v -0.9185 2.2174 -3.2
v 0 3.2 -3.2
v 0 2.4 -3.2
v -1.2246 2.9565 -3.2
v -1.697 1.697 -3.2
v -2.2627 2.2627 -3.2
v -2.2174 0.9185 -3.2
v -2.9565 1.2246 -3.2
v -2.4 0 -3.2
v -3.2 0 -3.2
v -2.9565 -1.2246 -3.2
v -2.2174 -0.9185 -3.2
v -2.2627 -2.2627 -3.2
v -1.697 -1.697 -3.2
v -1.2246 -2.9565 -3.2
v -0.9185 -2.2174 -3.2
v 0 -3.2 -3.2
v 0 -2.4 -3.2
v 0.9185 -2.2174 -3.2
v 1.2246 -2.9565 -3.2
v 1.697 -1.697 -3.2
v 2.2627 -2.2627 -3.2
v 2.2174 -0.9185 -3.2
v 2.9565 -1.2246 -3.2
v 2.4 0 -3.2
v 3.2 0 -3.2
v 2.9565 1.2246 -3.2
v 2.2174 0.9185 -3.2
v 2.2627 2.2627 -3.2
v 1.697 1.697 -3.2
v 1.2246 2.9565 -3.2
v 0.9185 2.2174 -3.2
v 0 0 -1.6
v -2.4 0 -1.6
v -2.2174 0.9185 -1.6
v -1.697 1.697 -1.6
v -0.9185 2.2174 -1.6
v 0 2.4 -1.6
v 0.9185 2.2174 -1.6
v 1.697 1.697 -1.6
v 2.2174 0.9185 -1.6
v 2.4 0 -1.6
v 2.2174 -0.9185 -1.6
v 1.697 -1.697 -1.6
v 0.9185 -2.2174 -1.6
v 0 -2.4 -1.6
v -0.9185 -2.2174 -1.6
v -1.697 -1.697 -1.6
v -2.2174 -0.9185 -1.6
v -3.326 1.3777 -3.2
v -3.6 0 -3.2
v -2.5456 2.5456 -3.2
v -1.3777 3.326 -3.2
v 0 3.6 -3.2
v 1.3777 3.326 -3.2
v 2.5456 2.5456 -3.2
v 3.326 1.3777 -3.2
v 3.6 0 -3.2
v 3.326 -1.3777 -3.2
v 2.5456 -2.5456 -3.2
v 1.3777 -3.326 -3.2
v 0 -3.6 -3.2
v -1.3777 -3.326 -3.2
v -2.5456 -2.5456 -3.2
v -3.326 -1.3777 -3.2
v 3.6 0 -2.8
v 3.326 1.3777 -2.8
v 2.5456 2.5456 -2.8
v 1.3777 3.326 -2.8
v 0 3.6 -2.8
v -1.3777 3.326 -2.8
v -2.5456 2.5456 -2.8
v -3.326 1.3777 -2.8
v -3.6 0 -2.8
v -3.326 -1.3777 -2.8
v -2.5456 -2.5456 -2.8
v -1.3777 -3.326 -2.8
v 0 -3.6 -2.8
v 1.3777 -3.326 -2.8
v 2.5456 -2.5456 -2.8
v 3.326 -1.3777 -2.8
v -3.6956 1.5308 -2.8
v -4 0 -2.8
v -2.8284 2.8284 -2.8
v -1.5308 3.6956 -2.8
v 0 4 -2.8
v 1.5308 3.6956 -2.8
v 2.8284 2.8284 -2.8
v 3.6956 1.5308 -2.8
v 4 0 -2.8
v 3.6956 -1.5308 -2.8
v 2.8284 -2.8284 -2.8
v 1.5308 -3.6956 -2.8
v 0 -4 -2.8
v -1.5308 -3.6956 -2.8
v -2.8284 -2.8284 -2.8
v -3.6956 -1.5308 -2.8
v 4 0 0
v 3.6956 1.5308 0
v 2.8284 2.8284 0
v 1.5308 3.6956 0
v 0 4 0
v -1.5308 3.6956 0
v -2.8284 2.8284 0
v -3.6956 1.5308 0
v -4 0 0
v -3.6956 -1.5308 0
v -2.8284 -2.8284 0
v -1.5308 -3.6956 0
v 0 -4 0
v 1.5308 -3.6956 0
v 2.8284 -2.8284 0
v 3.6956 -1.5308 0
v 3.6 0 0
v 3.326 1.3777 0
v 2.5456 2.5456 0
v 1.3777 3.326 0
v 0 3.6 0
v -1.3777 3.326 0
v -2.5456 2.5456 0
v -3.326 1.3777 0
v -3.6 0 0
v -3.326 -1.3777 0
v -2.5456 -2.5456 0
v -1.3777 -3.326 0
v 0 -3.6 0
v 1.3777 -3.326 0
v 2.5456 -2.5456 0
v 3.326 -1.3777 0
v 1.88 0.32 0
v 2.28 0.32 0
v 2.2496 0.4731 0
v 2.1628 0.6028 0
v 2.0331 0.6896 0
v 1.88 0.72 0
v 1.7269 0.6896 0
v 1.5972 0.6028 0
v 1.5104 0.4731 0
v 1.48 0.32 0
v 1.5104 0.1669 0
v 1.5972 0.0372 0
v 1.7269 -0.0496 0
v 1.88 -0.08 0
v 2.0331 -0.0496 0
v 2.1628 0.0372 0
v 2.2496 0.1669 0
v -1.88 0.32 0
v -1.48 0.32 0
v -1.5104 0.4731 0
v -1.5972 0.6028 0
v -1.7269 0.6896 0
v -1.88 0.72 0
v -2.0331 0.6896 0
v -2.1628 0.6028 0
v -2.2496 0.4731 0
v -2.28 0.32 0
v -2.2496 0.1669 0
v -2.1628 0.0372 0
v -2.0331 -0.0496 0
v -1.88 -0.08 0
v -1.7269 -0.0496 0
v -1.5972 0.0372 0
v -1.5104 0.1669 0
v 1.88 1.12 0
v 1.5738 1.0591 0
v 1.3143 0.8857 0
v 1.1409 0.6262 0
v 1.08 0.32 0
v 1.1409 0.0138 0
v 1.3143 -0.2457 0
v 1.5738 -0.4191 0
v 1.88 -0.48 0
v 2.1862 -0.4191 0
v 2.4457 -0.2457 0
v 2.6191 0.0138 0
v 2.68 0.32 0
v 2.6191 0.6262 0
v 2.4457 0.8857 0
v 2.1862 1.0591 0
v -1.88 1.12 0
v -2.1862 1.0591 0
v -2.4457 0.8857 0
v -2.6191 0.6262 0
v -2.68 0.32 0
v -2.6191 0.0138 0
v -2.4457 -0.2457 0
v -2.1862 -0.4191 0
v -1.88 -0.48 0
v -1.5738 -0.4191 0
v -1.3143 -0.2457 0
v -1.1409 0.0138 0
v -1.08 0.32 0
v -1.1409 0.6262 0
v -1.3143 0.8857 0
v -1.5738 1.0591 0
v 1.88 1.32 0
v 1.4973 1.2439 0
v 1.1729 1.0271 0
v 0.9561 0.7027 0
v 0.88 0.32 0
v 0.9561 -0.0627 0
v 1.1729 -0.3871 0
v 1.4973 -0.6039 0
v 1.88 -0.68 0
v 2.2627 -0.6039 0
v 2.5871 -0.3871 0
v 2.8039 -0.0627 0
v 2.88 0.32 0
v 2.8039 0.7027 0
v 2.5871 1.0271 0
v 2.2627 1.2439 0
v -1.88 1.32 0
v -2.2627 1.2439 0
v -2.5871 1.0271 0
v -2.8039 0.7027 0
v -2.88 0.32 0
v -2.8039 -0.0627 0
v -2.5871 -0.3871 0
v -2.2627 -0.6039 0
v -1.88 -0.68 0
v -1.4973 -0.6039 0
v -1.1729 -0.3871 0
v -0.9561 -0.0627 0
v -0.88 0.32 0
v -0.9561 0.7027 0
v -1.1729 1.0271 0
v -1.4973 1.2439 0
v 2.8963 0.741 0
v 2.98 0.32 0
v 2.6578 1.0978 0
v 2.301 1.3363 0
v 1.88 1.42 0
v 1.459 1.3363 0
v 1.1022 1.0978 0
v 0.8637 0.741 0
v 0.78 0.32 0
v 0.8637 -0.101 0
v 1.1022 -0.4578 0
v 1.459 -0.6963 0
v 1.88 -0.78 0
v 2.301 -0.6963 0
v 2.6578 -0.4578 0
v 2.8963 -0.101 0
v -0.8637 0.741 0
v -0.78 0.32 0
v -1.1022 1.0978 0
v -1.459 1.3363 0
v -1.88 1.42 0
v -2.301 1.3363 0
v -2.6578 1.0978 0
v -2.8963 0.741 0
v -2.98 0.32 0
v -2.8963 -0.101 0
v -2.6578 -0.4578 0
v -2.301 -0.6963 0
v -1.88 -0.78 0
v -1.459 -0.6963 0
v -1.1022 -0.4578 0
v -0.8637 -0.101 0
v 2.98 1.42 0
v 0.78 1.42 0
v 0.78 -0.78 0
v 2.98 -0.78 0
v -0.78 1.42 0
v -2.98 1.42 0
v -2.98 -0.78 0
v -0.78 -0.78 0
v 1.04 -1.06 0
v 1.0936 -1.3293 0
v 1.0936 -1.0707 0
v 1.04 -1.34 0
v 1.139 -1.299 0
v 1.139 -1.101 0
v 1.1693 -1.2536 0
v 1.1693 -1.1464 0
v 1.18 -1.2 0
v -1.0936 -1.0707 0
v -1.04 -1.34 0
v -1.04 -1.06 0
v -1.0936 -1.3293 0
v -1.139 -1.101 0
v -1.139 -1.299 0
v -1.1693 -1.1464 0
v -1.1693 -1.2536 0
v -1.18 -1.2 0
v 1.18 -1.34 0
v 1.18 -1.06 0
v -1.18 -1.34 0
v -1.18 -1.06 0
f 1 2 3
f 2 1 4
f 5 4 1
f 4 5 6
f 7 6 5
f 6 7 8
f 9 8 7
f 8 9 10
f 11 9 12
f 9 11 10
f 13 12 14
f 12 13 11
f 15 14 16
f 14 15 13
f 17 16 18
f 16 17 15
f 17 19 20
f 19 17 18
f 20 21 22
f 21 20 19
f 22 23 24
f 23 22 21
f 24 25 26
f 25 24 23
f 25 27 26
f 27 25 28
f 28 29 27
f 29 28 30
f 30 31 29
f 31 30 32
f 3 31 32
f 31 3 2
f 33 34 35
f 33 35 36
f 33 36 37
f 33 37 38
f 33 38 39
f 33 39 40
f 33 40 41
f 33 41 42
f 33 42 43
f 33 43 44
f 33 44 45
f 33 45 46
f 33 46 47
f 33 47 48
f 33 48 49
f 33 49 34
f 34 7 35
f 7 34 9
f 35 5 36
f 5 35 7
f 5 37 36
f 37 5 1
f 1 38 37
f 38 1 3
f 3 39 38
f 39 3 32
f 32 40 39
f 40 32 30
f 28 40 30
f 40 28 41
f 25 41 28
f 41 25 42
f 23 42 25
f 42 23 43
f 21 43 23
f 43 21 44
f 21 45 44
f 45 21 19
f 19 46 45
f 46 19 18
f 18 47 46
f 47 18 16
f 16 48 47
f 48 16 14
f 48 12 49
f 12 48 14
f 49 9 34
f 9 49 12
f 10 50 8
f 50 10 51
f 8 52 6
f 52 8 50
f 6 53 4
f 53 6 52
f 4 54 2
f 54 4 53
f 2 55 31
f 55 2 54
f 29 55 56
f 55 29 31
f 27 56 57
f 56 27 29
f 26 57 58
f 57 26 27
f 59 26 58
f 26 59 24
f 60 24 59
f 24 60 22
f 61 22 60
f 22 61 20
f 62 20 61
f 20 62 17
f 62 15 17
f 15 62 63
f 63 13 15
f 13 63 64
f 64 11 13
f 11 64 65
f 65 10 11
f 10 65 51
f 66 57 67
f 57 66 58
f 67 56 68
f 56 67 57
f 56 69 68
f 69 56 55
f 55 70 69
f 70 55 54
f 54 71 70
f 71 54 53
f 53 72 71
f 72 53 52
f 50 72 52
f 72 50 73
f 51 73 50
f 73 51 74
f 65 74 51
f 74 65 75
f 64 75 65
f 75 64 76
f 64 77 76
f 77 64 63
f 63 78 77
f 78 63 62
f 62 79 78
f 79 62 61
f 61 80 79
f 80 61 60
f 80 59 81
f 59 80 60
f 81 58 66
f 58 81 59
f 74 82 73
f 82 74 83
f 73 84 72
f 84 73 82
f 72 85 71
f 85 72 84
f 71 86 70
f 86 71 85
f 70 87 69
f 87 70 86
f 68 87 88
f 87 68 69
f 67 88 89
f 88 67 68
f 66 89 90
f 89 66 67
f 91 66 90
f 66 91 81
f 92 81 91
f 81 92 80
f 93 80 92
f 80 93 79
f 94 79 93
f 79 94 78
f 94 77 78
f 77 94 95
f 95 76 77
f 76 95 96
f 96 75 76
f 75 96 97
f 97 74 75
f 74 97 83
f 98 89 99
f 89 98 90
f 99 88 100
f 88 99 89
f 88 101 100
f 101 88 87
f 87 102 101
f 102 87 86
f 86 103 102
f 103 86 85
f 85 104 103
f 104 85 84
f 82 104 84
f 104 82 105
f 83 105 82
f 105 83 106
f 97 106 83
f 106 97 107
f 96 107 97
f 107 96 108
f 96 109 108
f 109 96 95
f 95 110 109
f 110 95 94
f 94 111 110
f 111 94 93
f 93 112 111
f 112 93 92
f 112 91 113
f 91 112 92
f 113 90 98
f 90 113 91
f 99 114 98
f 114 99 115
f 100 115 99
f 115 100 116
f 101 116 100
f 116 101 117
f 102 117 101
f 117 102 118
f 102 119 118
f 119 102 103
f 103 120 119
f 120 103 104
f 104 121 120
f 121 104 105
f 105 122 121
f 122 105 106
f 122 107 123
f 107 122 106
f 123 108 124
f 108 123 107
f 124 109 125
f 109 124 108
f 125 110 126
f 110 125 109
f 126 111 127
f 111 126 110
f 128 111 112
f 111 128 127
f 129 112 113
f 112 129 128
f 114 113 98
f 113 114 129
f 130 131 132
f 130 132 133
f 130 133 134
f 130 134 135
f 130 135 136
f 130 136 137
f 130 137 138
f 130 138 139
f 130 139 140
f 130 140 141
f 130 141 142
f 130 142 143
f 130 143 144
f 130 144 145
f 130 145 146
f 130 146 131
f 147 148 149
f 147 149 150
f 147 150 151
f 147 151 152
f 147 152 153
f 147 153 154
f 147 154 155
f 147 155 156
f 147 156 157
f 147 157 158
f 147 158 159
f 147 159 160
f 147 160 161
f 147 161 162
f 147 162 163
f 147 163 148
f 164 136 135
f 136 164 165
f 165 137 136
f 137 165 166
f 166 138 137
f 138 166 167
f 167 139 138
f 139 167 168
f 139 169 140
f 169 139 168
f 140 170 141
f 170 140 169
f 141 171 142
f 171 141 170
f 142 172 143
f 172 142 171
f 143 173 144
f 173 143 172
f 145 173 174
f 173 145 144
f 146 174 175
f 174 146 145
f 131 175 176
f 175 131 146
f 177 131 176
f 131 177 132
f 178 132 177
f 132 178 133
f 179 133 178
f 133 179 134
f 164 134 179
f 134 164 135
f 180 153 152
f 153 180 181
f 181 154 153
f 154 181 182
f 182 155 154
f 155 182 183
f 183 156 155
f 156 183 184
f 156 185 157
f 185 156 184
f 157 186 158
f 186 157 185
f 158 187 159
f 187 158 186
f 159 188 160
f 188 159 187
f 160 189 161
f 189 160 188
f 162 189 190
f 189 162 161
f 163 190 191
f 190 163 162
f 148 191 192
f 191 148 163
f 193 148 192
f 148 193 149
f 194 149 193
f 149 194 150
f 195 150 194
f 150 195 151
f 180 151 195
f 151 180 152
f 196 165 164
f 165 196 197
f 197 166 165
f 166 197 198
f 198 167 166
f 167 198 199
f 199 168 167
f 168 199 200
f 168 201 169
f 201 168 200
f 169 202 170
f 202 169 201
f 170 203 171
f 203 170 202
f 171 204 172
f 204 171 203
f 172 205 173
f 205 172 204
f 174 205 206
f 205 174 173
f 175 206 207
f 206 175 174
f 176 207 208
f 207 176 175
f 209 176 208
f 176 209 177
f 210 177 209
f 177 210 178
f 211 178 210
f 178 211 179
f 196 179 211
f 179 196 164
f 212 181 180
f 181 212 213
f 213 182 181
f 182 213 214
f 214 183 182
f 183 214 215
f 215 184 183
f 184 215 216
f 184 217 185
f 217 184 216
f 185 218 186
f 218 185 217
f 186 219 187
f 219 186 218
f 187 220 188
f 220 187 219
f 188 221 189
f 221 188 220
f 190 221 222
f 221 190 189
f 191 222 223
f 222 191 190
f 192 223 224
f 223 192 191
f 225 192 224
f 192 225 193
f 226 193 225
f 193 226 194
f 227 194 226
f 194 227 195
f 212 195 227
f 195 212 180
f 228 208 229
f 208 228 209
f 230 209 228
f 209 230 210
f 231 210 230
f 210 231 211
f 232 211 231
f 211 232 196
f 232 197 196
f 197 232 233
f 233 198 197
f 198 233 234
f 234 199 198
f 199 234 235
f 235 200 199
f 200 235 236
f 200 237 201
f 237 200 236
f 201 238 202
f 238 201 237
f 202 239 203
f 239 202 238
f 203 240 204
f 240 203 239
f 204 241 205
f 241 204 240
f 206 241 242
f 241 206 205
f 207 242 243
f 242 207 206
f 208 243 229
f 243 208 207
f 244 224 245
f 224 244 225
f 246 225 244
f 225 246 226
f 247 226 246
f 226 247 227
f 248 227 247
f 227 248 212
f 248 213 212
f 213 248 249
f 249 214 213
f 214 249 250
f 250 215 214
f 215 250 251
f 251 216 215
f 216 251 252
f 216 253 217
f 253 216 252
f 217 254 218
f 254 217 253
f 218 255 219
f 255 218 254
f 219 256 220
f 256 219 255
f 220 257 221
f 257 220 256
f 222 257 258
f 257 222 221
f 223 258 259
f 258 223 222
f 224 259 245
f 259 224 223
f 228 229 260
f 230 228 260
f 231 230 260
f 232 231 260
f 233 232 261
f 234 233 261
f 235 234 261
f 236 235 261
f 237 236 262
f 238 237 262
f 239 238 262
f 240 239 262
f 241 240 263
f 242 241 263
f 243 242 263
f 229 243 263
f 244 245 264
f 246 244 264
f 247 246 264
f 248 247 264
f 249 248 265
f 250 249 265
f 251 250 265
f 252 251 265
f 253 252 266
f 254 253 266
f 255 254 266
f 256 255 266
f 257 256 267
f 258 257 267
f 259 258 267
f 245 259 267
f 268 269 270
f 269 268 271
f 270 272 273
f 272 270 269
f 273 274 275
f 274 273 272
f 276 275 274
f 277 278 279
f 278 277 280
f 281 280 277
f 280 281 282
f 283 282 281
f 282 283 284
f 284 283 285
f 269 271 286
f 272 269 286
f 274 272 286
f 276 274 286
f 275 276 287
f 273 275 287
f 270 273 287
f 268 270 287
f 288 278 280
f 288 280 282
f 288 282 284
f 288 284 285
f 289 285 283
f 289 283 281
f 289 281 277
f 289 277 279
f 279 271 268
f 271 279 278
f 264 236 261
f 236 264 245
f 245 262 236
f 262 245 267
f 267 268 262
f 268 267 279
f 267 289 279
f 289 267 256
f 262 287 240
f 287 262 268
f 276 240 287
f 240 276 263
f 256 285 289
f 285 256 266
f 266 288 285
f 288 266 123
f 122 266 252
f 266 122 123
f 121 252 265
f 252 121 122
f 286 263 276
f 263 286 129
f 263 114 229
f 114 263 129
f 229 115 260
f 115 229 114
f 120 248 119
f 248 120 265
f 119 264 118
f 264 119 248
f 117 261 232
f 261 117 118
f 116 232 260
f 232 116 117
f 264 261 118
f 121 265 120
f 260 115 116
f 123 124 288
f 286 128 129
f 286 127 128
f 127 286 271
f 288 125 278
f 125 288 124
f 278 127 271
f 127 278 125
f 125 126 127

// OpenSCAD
use <../lib.scad>
use <../p/2-4chrd.scad>
use <../p/2-4ndis.scad>
use <../p/4-4disc.scad>
use <../p/4-4ering.scad>
use <../p/4-4ndis.scad>
use <../p/4-4ring1.scad>
use <../p/4-4ring10.scad>
use <../p/4-4ring4.scad>
use <s/98138s01.scad>
function ldraw_lib__98138p1q() = [
// 0 Tile  1 x  1 Round with Bright Light Yellow Emoji with Wide Open Eyes and Tight Lipped Straight Mouth Pattern
// 0 Name: 98138p1q.dat
// 0 Author: Gerald Lasser [GeraldLasser]
// 0 !LDRAW_ORG Part UPDATE 2024-02
// 0 !LICENSE Licensed under CC BY 4.0 : see CAreadme.txt
// 
// 0 BFC CERTIFY CCW
  [0,"BFC","CERTIFY"],
  [0,"BFC","CCW"],
// 
// 0 !KEYWORDS Astonished, Creativity Box, Dots, Scared
// 
// 0 !HISTORY 2022-01-14 [PTadmin] Official Update 2022-01
// 0 !HISTORY 2024-03-23 [OrionP] Updated ring primitives
// 0 !HISTORY 2024-03-24 [OrionP] Official Update 2024-02
// 
// 1 16 0 0 0 1 0 0 0 1 0 0 0 1 s\98138s01.dat
  [1,16,0,0,0,1,0,0,0,1,0,0,0,1, ldraw_lib__s__98138s01()],
// 1 226 0 0 0 9 0 0 0 1 0 0 0 9 4-4ering.dat
  [1,226,0,0,0,9,0,0,0,1,0,0,0,9, ldraw_lib__4_4ering()],
// 
// 1 0 4.7 0 .8 1 0 0 0 1 0 0 0 1 4-4disc.dat
  [1,0,4.7,0,.8,1,0,0,0,1,0,0,0,1, ldraw_lib__4_4disc()],
// 1 0 -4.7 0 .8 1 0 0 0 1 0 0 0 1 4-4disc.dat
  [1,0,-4.7,0,.8,1,0,0,0,1,0,0,0,1, ldraw_lib__4_4disc()],
// 1 15 4.7 0 .8 1 0 0 0 1 0 0 0 1 4-4ring1.dat
  [1,15,4.7,0,.8,1,0,0,0,1,0,0,0,1, ldraw_lib__4_4ring1()],
// 1 15 -4.7 0 .8 1 0 0 0 1 0 0 0 1 4-4ring1.dat
  [1,15,-4.7,0,.8,1,0,0,0,1,0,0,0,1, ldraw_lib__4_4ring1()],
// 1 0 4.7 0 .8 .5 0 0 0 1 0 0 0 .5 4-4ring4.dat
  [1,0,4.7,0,.8,.5,0,0,0,1,0,0,0,.5, ldraw_lib__4_4ring4()],
// 1 0 -4.7 0 .8 .5 0 0 0 1 0 0 0 .5 4-4ring4.dat
  [1,0,-4.7,0,.8,.5,0,0,0,1,0,0,0,.5, ldraw_lib__4_4ring4()],
// 1 0 4.7 0 .8 .25 0 0 0 1 0 0 0 .25 4-4ring10.dat
  [1,0,4.7,0,.8,.25,0,0,0,1,0,0,0,.25, ldraw_lib__4_4ring10()],
// 1 0 -4.7 0 .8 .25 0 0 0 1 0 0 0 .25 4-4ring10.dat
  [1,0,-4.7,0,.8,.25,0,0,0,1,0,0,0,.25, ldraw_lib__4_4ring10()],
// 1 226 4.7 0 .8 2.75 0 0 0 1 0 0 0 2.75 4-4ndis.dat
  [1,226,4.7,0,.8,2.75,0,0,0,1,0,0,0,2.75, ldraw_lib__4_4ndis()],
// 1 226 -4.7 0 .8 2.75 0 0 0 1 0 0 0 2.75 4-4ndis.dat
  [1,226,-4.7,0,.8,2.75,0,0,0,1,0,0,0,2.75, ldraw_lib__4_4ndis()],
// 
// 1 0 2.6 0 -3 0 0 .35 0 1 0 -.35 0 0 2-4chrd.dat
  [1,0,2.6,0,-3,0,0,.35,0,1,0,-.35,0,0, ldraw_lib__2_4chrd()],
// 1 0 -2.6 0 -3 0 0 -.35 0 1 0 -.35 0 0 2-4chrd.dat
  [1,0,-2.6,0,-3,0,0,-.35,0,1,0,-.35,0,0, ldraw_lib__2_4chrd()],
// 1 226 2.6 0 -3 0 0 .35 0 1 0 -.35 0 0 2-4ndis.dat
  [1,226,2.6,0,-3,0,0,.35,0,1,0,-.35,0,0, ldraw_lib__2_4ndis()],
// 1 226 -2.6 0 -3 0 0 -.35 0 1 0 -.35 0 0 2-4ndis.dat
  [1,226,-2.6,0,-3,0,0,-.35,0,1,0,-.35,0,0, ldraw_lib__2_4ndis()],
// 
// 4 0 2.6 0 -2.65 -2.6 0 -2.65 -2.6 0 -3.35 2.6 0 -3.35
  [4,0,2.6,0,-2.65,-2.6,0,-2.65,-2.6,0,-3.35,2.6,0,-3.35],
// 4 226 1.95 0 .8 1.95 0 3.55 -1.95 0 3.55 -1.95 0 .8
  [4,226,1.95,0,.8,1.95,0,3.55,-1.95,0,3.55,-1.95,0,.8],
// 4 226 1.95 0 .8 -1.95 0 .8 -1.95 0 -1.95 1.95 0 -1.95
  [4,226,1.95,0,.8,-1.95,0,.8,-1.95,0,-1.95,1.95,0,-1.95],
// 4 226 2.6 0 -2.65 1.95 0 -1.95 -1.95 0 -1.95 -2.6 0 -2.65
  [4,226,2.6,0,-2.65,1.95,0,-1.95,-1.95,0,-1.95,-2.6,0,-2.65],
// 4 226 -4.7 0 -1.95 -2.95 0 -2.65 -2.6 0 -2.65 -1.95 0 -1.95
  [4,226,-4.7,0,-1.95,-2.95,0,-2.65,-2.6,0,-2.65,-1.95,0,-1.95],
// 4 226 1.95 0 -1.95 2.6 0 -2.65 2.95 0 -2.65 4.7 0 -1.95
  [4,226,1.95,0,-1.95,2.6,0,-2.65,2.95,0,-2.65,4.7,0,-1.95],
// 4 226 7.45 0 -1.95 4.7 0 -1.95 2.95 0 -2.65 2.95 0 -3
  [4,226,7.45,0,-1.95,4.7,0,-1.95,2.95,0,-2.65,2.95,0,-3],
// 4 226 -2.95 0 -3 -2.95 0 -2.65 -4.7 0 -1.95 -7.45 0 -1.95
  [4,226,-2.95,0,-3,-2.95,0,-2.65,-4.7,0,-1.95,-7.45,0,-1.95],
// 4 226 -2.95 0 -3.35 -2.95 0 -3 -7.45 0 -1.95 -8.3151 0 -3.4443
  [4,226,-2.95,0,-3.35,-2.95,0,-3,-7.45,0,-1.95,-8.3151,0,-3.4443],
// 4 226 -9 0 0 -8.3151 0 -3.4443 -7.45 0 -1.95 -7.45 0 .8
  [4,226,-9,0,0,-8.3151,0,-3.4443,-7.45,0,-1.95,-7.45,0,.8],
// 4 226 -9 0 0 -7.45 0 .8 -7.45 0 3.55 -8.3151 0 3.4443
  [4,226,-9,0,0,-7.45,0,.8,-7.45,0,3.55,-8.3151,0,3.4443],
// 4 226 7.45 0 -1.95 2.95 0 -3 2.95 0 -3.35 8.3151 0 -3.4443
  [4,226,7.45,0,-1.95,2.95,0,-3,2.95,0,-3.35,8.3151,0,-3.4443],
// 4 226 7.45 0 -1.95 8.3151 0 -3.4443 9 0 0 7.45 0 .8
  [4,226,7.45,0,-1.95,8.3151,0,-3.4443,9,0,0,7.45,0,.8],
// 4 226 7.45 0 .8 9 0 0 8.3151 0 3.4443 7.45 0 3.55
  [4,226,7.45,0,.8,9,0,0,8.3151,0,3.4443,7.45,0,3.55],
// 4 226 -7.45 0 3.55 -4.7 0 3.55 -3.4443 0 8.3151 -6.3639 0 6.3639
  [4,226,-7.45,0,3.55,-4.7,0,3.55,-3.4443,0,8.3151,-6.3639,0,6.3639],
// 4 226 -4.7 0 3.55 -1.95 0 3.55 0 0 9 -3.4443 0 8.3151
  [4,226,-4.7,0,3.55,-1.95,0,3.55,0,0,9,-3.4443,0,8.3151],
// 4 226 0 0 9 1.95 0 3.55 4.7 0 3.55 3.4443 0 8.3151
  [4,226,0,0,9,1.95,0,3.55,4.7,0,3.55,3.4443,0,8.3151],
// 4 226 6.3639 0 6.3639 3.4443 0 8.3151 4.7 0 3.55 7.45 0 3.55
  [4,226,6.3639,0,6.3639,3.4443,0,8.3151,4.7,0,3.55,7.45,0,3.55],
// 3 226 -1.95 0 3.55 1.95 0 3.55 0 0 9
  [3,226,-1.95,0,3.55,1.95,0,3.55,0,0,9],
// 3 226 -8.3151 0 3.4443 -7.45 0 3.55 -6.3639 0 6.3639
  [3,226,-8.3151,0,3.4443,-7.45,0,3.55,-6.3639,0,6.3639],
// 3 226 7.45 0 3.55 8.3151 0 3.4443 6.3639 0 6.3639
  [3,226,7.45,0,3.55,8.3151,0,3.4443,6.3639,0,6.3639],
// 3 226 -8.3151 0 -3.4443 -6.3639 0 -6.3639 -2.95 0 -3.35
  [3,226,-8.3151,0,-3.4443,-6.3639,0,-6.3639,-2.95,0,-3.35],
// 3 226 2.95 0 -3.35 6.3639 0 -6.3639 8.3151 0 -3.4443
  [3,226,2.95,0,-3.35,6.3639,0,-6.3639,8.3151,0,-3.4443],
// 4 226 6.3639 0 -6.3639 2.95 0 -3.35 2.6 0 -3.35 3.4443 0 -8.3151
  [4,226,6.3639,0,-6.3639,2.95,0,-3.35,2.6,0,-3.35,3.4443,0,-8.3151],
// 4 226 -2.6 0 -3.35 -2.95 0 -3.35 -6.3639 0 -6.3639 -3.4443 0 -8.3151
  [4,226,-2.6,0,-3.35,-2.95,0,-3.35,-6.3639,0,-6.3639,-3.4443,0,-8.3151],
// 4 226 -2.6 0 -3.35 -3.4443 0 -8.3151 3.4443 0 -8.3151 2.6 0 -3.35
  [4,226,-2.6,0,-3.35,-3.4443,0,-8.3151,3.4443,0,-8.3151,2.6,0,-3.35],
// 3 226 -3.4443 0 -8.3151 0 0 -9 3.4443 0 -8.3151
  [3,226,-3.4443,0,-8.3151,0,0,-9,3.4443,0,-8.3151],
];
module ldraw_lib__98138p1q(step=0, col=false, unit=2/5, alt=false, line=0.2, solid=!$preview)
    makepoly(ldraw_lib__98138p1q(), step=step, col=col, unit=unit, alt=alt, line=line, solid=solid);
ldraw_lib__98138p1q(line=0.2);
